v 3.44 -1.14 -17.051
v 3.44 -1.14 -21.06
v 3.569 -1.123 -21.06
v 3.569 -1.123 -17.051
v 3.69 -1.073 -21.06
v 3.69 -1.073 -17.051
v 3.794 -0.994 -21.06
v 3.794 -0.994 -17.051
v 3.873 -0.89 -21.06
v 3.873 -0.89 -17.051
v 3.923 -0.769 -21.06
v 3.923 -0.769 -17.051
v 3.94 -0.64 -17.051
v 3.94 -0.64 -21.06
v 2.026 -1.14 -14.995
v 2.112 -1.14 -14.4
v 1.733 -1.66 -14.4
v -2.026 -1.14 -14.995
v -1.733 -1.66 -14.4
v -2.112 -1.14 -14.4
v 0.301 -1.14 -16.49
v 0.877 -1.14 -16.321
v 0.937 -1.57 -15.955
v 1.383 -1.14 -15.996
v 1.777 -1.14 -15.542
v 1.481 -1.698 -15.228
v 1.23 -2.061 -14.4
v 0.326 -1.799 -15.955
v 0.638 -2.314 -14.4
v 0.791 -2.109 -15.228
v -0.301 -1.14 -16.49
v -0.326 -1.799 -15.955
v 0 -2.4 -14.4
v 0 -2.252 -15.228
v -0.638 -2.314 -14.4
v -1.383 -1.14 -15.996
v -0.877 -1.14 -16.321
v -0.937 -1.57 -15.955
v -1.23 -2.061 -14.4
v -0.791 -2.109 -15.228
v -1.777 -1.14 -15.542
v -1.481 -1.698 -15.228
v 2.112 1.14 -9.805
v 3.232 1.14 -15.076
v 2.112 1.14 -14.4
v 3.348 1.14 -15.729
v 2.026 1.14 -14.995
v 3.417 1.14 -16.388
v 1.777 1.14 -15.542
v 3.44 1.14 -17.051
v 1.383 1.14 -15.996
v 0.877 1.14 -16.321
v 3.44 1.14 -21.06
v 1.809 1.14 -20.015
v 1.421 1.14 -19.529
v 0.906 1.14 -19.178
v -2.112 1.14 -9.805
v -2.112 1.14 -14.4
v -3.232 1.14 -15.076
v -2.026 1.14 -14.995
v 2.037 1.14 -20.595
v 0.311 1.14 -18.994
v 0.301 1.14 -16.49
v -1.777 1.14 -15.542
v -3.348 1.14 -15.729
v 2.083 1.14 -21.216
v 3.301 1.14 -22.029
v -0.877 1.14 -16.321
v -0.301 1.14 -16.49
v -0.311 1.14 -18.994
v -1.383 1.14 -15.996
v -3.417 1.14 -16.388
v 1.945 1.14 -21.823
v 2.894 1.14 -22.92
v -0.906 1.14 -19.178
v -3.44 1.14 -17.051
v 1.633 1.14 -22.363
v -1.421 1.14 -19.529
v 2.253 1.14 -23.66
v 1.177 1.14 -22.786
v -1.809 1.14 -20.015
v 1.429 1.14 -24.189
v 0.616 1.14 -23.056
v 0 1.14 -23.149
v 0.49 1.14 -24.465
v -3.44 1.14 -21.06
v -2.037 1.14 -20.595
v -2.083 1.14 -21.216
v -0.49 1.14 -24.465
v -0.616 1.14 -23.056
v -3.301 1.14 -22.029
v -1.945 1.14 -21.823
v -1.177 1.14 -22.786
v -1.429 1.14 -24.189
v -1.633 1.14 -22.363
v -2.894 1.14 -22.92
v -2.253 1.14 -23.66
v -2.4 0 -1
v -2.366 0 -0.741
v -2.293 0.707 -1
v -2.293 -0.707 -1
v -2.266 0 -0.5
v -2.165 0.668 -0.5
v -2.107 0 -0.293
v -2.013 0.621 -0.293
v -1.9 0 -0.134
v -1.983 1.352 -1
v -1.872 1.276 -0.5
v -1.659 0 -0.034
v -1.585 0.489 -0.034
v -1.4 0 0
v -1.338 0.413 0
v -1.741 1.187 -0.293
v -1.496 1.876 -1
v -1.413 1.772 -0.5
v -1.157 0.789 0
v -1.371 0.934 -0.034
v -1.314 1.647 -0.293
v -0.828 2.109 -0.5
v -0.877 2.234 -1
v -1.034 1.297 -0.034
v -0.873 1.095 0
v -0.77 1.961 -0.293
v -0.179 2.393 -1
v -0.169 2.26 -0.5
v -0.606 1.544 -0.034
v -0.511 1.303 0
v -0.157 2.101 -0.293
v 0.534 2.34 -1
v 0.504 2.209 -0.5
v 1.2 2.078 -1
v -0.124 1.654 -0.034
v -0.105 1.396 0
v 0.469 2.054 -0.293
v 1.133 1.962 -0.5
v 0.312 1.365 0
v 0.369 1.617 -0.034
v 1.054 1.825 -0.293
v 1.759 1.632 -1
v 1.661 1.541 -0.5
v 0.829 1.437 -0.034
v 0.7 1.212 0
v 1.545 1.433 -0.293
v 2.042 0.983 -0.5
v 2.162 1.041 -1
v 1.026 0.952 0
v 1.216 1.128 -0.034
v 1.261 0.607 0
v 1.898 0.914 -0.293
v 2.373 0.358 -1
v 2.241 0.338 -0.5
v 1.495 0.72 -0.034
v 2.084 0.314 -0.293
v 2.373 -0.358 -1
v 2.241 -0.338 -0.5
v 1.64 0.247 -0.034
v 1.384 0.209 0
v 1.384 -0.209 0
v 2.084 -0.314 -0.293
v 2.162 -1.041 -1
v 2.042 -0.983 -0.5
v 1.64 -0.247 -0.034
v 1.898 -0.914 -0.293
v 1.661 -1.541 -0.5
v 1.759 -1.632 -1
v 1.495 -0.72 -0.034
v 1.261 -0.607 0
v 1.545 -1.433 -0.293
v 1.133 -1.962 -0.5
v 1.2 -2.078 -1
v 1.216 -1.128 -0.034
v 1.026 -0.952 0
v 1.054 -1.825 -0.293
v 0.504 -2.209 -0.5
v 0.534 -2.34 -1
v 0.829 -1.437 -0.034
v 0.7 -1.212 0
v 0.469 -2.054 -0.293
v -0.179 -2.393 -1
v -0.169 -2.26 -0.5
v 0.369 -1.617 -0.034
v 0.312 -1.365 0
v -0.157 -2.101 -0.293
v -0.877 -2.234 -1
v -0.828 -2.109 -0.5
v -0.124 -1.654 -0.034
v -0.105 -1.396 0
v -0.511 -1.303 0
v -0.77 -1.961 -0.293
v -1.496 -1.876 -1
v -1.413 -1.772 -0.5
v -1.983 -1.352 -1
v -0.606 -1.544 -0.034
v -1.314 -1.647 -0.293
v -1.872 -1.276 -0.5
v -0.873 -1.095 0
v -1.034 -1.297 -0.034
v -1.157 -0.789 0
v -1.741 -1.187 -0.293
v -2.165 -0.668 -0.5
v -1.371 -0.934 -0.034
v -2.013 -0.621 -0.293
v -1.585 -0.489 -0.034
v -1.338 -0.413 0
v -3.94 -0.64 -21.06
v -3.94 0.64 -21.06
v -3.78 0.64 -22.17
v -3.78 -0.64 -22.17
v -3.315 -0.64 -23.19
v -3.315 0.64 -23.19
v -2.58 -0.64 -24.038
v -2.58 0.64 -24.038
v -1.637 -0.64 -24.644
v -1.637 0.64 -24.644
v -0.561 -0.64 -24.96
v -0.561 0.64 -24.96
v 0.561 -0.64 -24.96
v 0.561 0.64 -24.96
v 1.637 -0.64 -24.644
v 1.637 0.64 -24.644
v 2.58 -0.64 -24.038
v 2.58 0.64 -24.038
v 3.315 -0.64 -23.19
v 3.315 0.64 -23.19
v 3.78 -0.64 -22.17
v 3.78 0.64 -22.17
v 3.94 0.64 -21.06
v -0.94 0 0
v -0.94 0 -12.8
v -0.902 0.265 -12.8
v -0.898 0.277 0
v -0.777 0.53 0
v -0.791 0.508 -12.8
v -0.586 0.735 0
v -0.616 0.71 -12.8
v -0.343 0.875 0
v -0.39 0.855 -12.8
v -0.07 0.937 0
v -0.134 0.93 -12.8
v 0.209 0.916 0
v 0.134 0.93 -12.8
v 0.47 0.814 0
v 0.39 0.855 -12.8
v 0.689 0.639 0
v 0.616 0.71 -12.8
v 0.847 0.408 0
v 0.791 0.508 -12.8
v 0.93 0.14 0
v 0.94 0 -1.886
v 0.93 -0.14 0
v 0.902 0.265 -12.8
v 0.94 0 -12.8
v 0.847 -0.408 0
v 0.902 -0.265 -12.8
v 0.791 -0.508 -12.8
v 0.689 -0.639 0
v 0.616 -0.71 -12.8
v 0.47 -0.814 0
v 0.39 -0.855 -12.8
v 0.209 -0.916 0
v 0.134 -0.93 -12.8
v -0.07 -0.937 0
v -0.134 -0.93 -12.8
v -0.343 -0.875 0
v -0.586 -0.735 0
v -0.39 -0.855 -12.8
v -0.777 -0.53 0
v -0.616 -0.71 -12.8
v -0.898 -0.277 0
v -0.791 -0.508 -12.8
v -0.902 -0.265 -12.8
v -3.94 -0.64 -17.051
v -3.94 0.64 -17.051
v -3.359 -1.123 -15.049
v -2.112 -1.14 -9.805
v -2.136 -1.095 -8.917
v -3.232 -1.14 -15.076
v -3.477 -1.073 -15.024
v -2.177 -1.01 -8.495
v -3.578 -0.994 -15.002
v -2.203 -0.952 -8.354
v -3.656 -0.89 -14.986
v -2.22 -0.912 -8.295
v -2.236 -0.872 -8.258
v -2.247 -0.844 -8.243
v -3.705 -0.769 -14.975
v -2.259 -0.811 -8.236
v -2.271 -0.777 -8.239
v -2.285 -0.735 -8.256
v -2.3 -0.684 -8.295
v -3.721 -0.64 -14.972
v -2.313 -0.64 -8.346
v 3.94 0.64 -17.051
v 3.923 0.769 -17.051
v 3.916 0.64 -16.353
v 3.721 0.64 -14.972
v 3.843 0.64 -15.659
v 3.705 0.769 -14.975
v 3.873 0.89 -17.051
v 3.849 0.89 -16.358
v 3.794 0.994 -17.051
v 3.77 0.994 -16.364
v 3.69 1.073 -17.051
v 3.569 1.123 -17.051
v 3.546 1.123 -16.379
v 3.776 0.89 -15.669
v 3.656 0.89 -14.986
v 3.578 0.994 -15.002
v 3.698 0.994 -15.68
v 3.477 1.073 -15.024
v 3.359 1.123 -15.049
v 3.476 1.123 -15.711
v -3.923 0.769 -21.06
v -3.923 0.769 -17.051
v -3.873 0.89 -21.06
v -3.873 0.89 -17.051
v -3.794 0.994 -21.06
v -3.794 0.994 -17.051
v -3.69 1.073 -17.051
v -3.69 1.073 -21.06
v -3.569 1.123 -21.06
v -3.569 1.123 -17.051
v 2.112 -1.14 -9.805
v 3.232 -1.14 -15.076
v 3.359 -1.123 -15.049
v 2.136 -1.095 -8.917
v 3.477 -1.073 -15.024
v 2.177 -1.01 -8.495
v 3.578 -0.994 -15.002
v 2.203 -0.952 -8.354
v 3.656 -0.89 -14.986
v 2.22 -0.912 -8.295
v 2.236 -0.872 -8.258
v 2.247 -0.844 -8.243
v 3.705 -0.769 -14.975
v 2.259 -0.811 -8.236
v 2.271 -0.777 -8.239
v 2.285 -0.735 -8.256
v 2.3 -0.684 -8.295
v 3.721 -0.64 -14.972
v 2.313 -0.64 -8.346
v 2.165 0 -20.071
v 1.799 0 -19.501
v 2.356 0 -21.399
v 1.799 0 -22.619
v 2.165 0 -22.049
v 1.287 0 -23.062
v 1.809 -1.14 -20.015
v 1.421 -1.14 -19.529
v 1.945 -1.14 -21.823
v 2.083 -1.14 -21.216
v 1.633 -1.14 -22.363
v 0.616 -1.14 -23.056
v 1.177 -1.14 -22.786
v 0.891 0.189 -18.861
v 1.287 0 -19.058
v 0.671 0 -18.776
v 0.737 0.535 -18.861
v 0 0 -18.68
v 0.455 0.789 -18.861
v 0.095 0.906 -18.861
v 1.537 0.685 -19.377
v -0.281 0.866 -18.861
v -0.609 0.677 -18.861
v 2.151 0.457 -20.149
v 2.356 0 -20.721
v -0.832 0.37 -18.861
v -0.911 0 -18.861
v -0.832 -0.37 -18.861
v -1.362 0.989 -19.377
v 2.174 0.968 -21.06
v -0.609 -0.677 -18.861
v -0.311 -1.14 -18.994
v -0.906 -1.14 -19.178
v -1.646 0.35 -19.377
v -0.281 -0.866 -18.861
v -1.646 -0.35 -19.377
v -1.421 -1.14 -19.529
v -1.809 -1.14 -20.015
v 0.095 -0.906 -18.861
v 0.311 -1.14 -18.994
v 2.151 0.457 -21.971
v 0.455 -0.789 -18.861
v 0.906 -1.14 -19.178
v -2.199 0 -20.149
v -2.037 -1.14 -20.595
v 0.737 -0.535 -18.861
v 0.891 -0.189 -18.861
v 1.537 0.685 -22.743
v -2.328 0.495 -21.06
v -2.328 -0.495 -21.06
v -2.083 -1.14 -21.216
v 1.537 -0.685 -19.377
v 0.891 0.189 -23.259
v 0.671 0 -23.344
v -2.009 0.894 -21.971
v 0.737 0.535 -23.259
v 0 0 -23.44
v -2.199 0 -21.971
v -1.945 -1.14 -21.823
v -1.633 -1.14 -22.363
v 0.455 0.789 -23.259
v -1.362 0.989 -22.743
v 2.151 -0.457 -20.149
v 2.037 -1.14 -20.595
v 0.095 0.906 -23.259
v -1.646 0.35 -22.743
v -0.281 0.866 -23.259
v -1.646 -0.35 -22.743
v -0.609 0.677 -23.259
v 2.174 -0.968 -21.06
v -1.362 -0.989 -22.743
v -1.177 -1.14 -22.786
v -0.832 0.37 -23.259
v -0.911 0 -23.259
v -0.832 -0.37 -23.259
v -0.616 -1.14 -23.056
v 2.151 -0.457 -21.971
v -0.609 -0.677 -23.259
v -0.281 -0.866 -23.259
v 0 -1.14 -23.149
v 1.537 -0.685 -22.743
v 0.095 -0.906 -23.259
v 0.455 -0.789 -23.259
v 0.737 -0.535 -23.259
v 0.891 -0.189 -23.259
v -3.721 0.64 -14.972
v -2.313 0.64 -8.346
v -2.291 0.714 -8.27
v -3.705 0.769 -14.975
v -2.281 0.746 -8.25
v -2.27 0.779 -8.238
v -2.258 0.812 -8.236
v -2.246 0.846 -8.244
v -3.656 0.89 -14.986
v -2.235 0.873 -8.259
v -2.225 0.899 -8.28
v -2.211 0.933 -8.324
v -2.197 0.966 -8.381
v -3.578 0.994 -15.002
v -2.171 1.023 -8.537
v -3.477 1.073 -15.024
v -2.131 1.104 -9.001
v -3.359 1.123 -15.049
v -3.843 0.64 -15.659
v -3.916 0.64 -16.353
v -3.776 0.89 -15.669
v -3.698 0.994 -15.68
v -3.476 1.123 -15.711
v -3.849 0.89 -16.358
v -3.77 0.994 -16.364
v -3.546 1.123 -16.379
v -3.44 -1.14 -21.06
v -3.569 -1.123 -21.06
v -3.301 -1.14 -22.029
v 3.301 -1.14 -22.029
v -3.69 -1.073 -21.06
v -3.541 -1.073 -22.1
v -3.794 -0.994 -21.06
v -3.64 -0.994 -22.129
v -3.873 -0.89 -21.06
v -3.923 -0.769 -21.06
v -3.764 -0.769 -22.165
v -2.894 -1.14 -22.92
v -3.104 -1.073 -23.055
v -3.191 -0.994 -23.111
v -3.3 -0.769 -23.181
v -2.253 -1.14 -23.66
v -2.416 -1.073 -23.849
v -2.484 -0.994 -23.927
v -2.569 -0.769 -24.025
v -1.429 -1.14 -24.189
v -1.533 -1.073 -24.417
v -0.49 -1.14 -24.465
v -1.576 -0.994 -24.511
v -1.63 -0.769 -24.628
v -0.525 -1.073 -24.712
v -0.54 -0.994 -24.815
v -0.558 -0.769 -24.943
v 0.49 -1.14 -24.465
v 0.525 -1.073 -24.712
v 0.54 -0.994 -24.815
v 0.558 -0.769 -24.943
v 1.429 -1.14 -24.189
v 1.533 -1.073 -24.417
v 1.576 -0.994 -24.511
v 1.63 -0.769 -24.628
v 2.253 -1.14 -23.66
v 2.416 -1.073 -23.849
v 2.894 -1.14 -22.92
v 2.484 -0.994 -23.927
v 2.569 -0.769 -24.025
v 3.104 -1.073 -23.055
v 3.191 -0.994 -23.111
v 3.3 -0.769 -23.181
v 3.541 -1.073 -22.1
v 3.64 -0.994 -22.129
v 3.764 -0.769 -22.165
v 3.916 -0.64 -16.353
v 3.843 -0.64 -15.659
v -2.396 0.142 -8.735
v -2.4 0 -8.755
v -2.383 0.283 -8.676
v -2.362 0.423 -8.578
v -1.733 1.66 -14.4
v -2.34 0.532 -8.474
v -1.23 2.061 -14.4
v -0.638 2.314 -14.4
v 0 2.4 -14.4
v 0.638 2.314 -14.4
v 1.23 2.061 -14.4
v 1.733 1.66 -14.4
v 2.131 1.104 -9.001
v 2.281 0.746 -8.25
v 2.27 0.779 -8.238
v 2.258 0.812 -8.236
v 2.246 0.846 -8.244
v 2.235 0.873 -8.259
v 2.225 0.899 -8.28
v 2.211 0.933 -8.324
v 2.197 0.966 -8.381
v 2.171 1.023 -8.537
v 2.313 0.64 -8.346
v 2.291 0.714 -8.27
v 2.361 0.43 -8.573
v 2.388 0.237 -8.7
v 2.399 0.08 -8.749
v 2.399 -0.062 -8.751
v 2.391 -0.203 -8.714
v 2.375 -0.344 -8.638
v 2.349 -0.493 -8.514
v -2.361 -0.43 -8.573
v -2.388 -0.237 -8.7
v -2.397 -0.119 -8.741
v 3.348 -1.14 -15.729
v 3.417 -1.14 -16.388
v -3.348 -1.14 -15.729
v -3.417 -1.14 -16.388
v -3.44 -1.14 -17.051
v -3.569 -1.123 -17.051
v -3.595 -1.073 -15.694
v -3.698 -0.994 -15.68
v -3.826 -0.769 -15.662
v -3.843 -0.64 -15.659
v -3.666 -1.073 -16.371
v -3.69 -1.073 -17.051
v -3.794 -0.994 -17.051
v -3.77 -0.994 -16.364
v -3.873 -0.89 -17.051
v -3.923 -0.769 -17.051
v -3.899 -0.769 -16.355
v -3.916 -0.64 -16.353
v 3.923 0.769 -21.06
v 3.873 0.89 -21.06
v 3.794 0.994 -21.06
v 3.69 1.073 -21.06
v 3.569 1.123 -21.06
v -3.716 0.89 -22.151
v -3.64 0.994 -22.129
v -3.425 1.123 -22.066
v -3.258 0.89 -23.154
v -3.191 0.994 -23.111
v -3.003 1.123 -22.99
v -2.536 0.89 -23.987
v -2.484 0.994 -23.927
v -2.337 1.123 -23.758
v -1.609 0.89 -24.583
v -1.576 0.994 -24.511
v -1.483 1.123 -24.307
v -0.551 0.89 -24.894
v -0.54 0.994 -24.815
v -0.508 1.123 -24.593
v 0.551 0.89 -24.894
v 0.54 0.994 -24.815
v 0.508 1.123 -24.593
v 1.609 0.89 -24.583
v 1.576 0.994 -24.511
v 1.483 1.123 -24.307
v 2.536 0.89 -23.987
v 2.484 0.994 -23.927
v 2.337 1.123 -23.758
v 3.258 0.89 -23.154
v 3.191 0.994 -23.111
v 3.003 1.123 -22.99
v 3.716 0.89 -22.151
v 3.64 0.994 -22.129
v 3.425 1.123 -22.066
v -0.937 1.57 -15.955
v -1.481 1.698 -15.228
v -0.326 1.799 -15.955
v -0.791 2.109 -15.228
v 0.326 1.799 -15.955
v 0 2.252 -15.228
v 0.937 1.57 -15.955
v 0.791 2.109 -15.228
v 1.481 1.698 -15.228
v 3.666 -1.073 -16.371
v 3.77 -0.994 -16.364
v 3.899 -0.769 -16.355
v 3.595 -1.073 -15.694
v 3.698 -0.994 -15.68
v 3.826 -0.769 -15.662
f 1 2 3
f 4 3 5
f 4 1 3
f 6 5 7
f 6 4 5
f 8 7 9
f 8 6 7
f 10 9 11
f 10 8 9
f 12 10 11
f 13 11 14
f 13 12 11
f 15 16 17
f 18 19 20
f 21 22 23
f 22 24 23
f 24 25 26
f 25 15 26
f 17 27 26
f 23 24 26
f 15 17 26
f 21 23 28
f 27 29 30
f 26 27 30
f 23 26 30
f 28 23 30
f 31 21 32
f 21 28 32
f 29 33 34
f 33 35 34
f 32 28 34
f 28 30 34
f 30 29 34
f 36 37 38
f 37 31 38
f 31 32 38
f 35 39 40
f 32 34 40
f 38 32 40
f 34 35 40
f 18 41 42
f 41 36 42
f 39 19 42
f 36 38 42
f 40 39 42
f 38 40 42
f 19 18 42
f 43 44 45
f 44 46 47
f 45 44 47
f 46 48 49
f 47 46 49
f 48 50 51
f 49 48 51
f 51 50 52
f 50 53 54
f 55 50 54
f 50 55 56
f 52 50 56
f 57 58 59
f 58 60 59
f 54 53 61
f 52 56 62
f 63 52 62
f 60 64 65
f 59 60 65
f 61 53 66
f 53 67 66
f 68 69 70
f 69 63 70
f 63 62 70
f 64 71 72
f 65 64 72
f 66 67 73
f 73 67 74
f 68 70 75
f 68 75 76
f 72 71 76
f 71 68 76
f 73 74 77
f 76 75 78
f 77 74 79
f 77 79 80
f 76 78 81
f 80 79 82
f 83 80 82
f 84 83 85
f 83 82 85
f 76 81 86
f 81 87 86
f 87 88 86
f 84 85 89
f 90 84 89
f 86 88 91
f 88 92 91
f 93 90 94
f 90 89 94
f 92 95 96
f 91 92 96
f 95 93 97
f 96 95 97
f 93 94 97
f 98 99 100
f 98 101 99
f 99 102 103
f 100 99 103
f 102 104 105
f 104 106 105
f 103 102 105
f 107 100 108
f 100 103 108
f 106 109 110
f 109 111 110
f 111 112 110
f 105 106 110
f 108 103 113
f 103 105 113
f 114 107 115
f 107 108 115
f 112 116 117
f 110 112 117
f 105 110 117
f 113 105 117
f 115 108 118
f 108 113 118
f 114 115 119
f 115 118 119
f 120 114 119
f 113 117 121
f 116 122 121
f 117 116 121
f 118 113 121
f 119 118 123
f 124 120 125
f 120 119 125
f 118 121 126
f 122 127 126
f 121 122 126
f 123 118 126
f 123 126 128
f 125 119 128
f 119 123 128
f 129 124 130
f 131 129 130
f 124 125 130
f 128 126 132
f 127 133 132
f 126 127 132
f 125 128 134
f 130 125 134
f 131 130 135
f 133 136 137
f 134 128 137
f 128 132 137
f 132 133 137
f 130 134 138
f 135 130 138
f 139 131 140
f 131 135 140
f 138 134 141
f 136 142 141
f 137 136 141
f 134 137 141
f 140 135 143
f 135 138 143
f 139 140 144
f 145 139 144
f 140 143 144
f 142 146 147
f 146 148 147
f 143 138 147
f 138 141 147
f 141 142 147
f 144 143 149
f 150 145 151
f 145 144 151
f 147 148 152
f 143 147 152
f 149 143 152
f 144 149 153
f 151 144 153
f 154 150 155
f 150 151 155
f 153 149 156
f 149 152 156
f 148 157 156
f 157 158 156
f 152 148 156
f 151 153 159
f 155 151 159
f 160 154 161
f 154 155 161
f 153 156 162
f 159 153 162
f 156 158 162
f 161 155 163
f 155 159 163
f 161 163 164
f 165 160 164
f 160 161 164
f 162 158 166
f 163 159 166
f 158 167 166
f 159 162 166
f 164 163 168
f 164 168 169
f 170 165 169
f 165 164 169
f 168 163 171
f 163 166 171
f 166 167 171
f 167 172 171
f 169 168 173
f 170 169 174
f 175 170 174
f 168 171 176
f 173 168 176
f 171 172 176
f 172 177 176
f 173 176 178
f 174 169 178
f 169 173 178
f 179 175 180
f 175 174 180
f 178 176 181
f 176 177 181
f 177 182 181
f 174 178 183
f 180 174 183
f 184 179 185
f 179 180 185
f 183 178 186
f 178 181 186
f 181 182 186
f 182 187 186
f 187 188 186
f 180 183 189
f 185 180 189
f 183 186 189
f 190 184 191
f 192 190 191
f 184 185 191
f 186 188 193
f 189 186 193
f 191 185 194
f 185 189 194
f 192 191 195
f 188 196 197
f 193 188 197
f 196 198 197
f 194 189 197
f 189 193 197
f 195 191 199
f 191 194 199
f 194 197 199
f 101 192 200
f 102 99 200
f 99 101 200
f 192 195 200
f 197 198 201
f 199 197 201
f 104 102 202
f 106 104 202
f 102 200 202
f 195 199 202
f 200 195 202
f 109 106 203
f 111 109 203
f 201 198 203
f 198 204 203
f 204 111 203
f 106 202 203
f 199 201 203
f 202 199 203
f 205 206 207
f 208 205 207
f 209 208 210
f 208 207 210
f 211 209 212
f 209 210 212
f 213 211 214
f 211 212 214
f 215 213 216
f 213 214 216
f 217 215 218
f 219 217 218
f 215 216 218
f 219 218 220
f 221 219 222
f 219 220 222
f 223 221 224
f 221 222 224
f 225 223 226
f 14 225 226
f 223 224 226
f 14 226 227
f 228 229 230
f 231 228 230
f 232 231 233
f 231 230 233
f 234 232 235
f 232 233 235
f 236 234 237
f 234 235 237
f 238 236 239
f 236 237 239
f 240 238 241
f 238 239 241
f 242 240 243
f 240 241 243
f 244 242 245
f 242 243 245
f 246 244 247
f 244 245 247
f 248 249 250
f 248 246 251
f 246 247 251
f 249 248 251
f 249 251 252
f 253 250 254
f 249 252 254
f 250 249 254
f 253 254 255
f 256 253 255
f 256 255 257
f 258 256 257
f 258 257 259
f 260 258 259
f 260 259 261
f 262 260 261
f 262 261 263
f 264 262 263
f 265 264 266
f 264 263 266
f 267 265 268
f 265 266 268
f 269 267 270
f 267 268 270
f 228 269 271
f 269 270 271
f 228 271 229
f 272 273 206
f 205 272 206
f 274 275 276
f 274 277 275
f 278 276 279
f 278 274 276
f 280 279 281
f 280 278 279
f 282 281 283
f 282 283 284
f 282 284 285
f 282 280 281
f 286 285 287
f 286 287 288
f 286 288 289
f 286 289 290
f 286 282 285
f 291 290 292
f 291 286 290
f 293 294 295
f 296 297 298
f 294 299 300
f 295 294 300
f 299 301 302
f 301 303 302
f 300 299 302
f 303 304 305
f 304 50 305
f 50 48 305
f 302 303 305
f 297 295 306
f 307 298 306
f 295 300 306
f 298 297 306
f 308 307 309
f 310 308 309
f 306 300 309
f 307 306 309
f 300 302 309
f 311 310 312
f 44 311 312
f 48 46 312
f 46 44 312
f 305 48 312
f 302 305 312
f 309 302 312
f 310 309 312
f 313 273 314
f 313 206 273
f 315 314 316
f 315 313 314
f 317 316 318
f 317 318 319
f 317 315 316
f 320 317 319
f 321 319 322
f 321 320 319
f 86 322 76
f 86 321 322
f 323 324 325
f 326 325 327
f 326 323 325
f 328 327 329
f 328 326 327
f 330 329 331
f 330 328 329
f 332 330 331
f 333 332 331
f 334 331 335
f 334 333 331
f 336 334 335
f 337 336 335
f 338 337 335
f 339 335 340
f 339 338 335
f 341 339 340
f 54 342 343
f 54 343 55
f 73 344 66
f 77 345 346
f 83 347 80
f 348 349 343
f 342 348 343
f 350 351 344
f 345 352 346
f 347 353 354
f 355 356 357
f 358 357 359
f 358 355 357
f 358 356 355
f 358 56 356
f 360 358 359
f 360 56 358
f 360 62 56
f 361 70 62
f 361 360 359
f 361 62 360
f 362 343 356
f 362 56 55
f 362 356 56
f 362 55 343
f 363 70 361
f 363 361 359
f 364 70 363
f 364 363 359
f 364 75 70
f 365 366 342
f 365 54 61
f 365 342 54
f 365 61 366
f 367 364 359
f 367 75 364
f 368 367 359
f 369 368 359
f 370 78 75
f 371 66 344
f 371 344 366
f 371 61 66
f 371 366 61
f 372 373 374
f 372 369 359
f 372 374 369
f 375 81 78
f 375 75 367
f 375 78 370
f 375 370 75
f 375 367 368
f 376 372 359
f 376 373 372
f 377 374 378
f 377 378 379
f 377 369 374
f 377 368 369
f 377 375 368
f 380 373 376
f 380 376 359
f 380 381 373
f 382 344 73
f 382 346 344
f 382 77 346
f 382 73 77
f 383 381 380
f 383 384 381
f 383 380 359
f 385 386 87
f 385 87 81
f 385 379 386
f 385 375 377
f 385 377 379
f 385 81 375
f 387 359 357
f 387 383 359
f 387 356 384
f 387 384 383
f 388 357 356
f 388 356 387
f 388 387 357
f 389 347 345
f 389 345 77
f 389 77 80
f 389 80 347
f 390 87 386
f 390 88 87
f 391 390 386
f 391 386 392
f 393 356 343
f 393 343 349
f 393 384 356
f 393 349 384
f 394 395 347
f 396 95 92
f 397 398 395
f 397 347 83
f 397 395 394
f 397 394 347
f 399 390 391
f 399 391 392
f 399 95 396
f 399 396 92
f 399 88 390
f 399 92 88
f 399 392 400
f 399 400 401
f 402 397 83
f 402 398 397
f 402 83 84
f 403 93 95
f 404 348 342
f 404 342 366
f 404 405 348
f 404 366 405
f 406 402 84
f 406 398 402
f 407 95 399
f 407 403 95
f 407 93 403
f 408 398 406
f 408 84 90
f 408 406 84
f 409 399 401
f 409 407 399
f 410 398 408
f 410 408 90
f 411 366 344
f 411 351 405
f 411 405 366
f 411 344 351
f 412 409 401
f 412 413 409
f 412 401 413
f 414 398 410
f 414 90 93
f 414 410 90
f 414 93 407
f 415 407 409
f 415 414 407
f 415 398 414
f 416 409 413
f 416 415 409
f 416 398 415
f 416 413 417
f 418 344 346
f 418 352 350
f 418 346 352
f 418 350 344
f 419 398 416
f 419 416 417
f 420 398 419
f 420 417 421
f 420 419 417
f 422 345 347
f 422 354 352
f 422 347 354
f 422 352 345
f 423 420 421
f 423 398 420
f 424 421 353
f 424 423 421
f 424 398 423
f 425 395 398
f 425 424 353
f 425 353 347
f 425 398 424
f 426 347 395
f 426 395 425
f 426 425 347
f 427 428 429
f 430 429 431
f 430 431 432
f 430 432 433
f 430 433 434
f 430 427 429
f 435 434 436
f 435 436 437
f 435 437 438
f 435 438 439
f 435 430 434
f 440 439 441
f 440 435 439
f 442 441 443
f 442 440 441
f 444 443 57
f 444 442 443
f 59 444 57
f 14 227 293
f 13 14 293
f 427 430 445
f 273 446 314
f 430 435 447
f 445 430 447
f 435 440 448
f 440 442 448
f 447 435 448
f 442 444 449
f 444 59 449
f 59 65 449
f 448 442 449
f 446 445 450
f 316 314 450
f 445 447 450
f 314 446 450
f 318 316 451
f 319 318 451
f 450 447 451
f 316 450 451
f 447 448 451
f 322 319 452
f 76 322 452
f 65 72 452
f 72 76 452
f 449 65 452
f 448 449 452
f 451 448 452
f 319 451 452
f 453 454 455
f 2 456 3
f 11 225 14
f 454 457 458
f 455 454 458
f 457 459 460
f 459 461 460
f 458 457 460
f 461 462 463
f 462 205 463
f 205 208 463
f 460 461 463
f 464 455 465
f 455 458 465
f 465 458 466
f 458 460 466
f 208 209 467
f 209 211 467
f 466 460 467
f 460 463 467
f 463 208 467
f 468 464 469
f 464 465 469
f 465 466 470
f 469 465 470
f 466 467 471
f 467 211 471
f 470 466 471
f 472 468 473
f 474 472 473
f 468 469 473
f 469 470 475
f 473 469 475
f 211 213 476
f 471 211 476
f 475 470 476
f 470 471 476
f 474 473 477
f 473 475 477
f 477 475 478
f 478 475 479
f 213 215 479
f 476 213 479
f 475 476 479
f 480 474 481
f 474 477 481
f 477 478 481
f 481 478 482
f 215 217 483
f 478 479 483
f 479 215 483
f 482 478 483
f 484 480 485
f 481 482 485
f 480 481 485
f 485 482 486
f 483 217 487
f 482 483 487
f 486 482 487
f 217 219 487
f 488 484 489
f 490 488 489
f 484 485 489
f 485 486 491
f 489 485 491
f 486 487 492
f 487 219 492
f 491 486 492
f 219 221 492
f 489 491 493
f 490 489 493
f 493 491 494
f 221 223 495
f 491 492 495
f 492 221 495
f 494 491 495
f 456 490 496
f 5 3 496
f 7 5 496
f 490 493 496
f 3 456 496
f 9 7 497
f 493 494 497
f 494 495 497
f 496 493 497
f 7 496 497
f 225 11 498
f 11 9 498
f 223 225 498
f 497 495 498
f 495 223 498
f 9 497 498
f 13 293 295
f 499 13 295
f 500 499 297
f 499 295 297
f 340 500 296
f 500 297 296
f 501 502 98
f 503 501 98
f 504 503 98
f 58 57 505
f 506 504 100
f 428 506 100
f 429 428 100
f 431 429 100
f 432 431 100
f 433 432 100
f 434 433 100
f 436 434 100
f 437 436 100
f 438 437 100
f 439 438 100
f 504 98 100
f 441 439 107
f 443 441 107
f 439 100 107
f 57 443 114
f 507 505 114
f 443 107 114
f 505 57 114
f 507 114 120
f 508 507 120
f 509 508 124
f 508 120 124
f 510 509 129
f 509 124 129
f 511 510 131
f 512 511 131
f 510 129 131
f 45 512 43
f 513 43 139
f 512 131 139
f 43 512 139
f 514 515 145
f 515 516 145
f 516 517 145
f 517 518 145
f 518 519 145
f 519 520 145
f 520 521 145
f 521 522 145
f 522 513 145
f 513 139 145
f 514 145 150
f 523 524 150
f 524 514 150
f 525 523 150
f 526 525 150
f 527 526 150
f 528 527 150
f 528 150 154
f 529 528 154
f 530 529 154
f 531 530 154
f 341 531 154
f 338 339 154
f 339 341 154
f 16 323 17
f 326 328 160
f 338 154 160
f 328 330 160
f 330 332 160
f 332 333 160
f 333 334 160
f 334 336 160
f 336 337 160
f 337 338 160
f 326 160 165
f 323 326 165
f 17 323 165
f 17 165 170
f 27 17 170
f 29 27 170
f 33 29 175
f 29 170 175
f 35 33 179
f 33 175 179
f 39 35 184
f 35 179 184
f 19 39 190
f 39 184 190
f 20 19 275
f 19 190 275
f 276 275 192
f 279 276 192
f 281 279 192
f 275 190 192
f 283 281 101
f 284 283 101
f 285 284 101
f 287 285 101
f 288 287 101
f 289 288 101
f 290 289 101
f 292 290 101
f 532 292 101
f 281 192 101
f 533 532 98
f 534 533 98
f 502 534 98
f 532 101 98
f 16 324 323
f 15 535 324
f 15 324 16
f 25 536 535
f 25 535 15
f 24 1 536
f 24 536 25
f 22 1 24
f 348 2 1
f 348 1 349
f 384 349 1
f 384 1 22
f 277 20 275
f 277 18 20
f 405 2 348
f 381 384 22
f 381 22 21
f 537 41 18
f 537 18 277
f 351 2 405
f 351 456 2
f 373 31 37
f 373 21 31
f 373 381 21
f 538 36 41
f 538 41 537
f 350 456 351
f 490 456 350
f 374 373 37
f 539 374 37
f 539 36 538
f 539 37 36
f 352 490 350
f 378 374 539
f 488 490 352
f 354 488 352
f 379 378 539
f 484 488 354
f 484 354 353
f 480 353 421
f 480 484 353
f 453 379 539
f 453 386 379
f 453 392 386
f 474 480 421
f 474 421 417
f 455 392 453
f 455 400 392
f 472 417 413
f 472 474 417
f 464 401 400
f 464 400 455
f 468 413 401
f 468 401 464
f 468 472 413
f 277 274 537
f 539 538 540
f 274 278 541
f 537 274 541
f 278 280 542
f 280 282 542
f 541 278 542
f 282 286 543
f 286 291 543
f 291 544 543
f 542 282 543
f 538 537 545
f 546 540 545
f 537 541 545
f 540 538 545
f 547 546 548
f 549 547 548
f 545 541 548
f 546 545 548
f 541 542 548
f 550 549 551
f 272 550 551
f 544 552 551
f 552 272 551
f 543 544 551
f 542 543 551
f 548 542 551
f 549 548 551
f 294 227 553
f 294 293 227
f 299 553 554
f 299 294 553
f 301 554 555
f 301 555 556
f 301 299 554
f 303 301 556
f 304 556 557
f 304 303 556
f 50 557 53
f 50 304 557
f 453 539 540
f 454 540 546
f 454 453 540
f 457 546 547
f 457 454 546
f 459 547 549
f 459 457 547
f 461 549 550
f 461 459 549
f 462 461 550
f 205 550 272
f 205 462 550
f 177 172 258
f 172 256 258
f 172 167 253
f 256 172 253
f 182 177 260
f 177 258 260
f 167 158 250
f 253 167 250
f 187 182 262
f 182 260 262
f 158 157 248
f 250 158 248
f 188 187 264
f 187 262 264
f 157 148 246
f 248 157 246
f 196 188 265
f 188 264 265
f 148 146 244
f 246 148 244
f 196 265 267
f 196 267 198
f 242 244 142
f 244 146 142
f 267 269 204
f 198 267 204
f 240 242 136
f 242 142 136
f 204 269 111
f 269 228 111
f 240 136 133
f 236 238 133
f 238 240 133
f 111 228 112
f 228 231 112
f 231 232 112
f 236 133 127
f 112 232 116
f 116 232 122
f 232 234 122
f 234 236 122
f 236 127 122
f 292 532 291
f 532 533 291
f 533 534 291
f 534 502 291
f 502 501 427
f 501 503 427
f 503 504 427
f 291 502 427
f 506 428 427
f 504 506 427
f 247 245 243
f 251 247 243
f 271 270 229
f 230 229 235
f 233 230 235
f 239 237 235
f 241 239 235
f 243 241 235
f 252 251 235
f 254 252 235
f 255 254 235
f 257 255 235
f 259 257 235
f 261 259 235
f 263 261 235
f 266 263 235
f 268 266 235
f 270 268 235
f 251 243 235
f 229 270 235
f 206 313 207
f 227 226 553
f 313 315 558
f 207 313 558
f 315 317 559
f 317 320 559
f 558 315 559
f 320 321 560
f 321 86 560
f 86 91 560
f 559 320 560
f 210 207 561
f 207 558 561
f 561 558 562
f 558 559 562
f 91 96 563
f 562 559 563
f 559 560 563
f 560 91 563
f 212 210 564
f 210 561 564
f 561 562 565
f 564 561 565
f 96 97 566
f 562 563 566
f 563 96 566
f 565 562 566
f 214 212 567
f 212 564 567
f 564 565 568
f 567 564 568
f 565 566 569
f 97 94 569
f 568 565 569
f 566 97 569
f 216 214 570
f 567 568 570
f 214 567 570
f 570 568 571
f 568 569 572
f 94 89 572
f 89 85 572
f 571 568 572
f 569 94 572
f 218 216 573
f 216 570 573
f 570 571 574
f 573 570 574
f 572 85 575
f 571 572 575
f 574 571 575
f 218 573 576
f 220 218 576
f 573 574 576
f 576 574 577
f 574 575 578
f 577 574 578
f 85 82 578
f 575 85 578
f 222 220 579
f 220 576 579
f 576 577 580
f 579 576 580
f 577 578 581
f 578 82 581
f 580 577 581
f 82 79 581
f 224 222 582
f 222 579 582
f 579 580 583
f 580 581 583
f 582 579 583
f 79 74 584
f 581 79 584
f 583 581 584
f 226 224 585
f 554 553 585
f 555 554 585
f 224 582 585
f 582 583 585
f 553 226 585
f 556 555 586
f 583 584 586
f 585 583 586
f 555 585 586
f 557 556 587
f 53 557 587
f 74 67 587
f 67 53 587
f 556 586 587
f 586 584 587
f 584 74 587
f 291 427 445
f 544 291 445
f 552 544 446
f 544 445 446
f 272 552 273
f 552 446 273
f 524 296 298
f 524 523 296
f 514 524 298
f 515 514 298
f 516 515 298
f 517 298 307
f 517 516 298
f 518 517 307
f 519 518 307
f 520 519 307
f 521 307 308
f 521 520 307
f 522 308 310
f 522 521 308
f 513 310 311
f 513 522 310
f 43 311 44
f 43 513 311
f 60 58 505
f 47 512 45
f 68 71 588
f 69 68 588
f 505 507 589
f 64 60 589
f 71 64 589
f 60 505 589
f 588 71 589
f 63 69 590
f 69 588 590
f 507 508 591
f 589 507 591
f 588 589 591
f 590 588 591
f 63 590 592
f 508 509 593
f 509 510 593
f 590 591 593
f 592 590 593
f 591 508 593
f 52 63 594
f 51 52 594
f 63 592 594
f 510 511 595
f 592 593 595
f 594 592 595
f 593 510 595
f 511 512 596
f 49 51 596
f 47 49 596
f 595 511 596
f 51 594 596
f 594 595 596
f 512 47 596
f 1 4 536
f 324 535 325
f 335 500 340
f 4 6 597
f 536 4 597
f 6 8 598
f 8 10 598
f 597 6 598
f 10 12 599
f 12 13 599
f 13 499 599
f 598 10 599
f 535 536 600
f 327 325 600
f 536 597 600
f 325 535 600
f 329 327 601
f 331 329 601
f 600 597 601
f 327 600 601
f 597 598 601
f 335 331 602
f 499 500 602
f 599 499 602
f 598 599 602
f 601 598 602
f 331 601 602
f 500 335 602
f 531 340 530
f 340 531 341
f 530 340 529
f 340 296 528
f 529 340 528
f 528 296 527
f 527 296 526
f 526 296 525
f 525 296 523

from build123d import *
from OCP.BRepFilletAPI import BRepFilletAPI_MakeFillet

# Parameters (mm, degrees)
FLAT_DEPTH = 1.14
FILLET2_R1 = 0.5
FILLET2_R2 = 1


with BuildPart() as part:
    # Sketch1 → Revolve1 (revolve)
    with BuildSketch(Plane(origin=(0, 0, 0), x_dir=(1, 0, 0), z_dir=(0, 1, 0))):
        with BuildLine():
            Line((0, 12.8), (0, 16.8))
            ThreePointArc((0, 16.8), (-1.697056275, 16.097056275), (-2.4, 14.4))
            Line((-2.4, 14.4), (-2.4, 0))
            Line((-2.4, 0), (-0.94, 0))
            Line((-0.94, 0), (-0.94, 12.8))
            Line((-0.94, 12.8), (0, 12.8))
        make_face()
    revolve(axis=Axis((0, 0, -12.8), (0, 0, -1)))

    # Sketch3 → Flat (add, symmetric)
    with BuildSketch(Plane(origin=(0, 0, 0), x_dir=(1, 0, 0), z_dir=(0, 1, 0))):
        with BuildLine():
            Line((3.721476007, 14.971925444), (0.94, 1.886109672))
            Line((0.94, 1.886109672), (0.94, 12.8))
            Line((0.94, 12.8), (-0.94, 12.8))
            Line((-0.94, 12.8), (-0.94, 1.886109672))
            Line((-0.94, 1.886109672), (-3.721476007, 14.971925444))
            ThreePointArc((-3.721476007, 14.971925444), (-3.885218954, 16.00575772), (-3.94, 17.051042353))
            Line((-3.94, 17.051042353), (-3.94, 21.06))
            ThreePointArc((-3.94, 21.06), (0, 25), (3.94, 21.06))
            Line((3.94, 21.06), (3.94, 17.051042353))
            ThreePointArc((3.94, 17.051042353), (3.885218954, 16.00575772), (3.721476007, 14.971925444))
        make_face()
    extrude(amount=FLAT_DEPTH, both=True)

    # Fillet2: one fillet with a radius per group of edges: ONE call of the kernel's fillet builder (fillet() takes one radius for all edges)
    fillet2_edges_1 = [part.edges().sort_by_distance(p)[0] for p in [
        (0, 1.14, -25),
        (0, -1.14, -25),
    ]]
    fillet2_edges_2 = [part.edges().sort_by_distance(p)[0] for p in [
        (2.4, 0, 0),
    ]]
    fillet2 = BRepFilletAPI_MakeFillet(part.part.solid().wrapped)
    for e in fillet2_edges_1:
        fillet2.Add(FILLET2_R1, e.wrapped)
    for e in fillet2_edges_2:
        fillet2.Add(FILLET2_R2, e.wrapped)
    add(Compound.cast(fillet2.Shape()), mode=Mode.REPLACE)

    # Sketch4 → Ball Hole (revolve, cut)
    with BuildSketch(Plane(origin=(0, 0, 0), x_dir=(1, 0, 0), z_dir=(0, 1, 0))):
        with BuildLine():
            Line((0, 23.44), (0, 18.68))
            ThreePointArc((0, 18.68), (2.38, 21.06), (0, 23.44))
        make_face()
    revolve(axis=Axis((0, 0, -23.44), (0, 0, 1)), mode=Mode.SUBTRACT)


solid = part.part
